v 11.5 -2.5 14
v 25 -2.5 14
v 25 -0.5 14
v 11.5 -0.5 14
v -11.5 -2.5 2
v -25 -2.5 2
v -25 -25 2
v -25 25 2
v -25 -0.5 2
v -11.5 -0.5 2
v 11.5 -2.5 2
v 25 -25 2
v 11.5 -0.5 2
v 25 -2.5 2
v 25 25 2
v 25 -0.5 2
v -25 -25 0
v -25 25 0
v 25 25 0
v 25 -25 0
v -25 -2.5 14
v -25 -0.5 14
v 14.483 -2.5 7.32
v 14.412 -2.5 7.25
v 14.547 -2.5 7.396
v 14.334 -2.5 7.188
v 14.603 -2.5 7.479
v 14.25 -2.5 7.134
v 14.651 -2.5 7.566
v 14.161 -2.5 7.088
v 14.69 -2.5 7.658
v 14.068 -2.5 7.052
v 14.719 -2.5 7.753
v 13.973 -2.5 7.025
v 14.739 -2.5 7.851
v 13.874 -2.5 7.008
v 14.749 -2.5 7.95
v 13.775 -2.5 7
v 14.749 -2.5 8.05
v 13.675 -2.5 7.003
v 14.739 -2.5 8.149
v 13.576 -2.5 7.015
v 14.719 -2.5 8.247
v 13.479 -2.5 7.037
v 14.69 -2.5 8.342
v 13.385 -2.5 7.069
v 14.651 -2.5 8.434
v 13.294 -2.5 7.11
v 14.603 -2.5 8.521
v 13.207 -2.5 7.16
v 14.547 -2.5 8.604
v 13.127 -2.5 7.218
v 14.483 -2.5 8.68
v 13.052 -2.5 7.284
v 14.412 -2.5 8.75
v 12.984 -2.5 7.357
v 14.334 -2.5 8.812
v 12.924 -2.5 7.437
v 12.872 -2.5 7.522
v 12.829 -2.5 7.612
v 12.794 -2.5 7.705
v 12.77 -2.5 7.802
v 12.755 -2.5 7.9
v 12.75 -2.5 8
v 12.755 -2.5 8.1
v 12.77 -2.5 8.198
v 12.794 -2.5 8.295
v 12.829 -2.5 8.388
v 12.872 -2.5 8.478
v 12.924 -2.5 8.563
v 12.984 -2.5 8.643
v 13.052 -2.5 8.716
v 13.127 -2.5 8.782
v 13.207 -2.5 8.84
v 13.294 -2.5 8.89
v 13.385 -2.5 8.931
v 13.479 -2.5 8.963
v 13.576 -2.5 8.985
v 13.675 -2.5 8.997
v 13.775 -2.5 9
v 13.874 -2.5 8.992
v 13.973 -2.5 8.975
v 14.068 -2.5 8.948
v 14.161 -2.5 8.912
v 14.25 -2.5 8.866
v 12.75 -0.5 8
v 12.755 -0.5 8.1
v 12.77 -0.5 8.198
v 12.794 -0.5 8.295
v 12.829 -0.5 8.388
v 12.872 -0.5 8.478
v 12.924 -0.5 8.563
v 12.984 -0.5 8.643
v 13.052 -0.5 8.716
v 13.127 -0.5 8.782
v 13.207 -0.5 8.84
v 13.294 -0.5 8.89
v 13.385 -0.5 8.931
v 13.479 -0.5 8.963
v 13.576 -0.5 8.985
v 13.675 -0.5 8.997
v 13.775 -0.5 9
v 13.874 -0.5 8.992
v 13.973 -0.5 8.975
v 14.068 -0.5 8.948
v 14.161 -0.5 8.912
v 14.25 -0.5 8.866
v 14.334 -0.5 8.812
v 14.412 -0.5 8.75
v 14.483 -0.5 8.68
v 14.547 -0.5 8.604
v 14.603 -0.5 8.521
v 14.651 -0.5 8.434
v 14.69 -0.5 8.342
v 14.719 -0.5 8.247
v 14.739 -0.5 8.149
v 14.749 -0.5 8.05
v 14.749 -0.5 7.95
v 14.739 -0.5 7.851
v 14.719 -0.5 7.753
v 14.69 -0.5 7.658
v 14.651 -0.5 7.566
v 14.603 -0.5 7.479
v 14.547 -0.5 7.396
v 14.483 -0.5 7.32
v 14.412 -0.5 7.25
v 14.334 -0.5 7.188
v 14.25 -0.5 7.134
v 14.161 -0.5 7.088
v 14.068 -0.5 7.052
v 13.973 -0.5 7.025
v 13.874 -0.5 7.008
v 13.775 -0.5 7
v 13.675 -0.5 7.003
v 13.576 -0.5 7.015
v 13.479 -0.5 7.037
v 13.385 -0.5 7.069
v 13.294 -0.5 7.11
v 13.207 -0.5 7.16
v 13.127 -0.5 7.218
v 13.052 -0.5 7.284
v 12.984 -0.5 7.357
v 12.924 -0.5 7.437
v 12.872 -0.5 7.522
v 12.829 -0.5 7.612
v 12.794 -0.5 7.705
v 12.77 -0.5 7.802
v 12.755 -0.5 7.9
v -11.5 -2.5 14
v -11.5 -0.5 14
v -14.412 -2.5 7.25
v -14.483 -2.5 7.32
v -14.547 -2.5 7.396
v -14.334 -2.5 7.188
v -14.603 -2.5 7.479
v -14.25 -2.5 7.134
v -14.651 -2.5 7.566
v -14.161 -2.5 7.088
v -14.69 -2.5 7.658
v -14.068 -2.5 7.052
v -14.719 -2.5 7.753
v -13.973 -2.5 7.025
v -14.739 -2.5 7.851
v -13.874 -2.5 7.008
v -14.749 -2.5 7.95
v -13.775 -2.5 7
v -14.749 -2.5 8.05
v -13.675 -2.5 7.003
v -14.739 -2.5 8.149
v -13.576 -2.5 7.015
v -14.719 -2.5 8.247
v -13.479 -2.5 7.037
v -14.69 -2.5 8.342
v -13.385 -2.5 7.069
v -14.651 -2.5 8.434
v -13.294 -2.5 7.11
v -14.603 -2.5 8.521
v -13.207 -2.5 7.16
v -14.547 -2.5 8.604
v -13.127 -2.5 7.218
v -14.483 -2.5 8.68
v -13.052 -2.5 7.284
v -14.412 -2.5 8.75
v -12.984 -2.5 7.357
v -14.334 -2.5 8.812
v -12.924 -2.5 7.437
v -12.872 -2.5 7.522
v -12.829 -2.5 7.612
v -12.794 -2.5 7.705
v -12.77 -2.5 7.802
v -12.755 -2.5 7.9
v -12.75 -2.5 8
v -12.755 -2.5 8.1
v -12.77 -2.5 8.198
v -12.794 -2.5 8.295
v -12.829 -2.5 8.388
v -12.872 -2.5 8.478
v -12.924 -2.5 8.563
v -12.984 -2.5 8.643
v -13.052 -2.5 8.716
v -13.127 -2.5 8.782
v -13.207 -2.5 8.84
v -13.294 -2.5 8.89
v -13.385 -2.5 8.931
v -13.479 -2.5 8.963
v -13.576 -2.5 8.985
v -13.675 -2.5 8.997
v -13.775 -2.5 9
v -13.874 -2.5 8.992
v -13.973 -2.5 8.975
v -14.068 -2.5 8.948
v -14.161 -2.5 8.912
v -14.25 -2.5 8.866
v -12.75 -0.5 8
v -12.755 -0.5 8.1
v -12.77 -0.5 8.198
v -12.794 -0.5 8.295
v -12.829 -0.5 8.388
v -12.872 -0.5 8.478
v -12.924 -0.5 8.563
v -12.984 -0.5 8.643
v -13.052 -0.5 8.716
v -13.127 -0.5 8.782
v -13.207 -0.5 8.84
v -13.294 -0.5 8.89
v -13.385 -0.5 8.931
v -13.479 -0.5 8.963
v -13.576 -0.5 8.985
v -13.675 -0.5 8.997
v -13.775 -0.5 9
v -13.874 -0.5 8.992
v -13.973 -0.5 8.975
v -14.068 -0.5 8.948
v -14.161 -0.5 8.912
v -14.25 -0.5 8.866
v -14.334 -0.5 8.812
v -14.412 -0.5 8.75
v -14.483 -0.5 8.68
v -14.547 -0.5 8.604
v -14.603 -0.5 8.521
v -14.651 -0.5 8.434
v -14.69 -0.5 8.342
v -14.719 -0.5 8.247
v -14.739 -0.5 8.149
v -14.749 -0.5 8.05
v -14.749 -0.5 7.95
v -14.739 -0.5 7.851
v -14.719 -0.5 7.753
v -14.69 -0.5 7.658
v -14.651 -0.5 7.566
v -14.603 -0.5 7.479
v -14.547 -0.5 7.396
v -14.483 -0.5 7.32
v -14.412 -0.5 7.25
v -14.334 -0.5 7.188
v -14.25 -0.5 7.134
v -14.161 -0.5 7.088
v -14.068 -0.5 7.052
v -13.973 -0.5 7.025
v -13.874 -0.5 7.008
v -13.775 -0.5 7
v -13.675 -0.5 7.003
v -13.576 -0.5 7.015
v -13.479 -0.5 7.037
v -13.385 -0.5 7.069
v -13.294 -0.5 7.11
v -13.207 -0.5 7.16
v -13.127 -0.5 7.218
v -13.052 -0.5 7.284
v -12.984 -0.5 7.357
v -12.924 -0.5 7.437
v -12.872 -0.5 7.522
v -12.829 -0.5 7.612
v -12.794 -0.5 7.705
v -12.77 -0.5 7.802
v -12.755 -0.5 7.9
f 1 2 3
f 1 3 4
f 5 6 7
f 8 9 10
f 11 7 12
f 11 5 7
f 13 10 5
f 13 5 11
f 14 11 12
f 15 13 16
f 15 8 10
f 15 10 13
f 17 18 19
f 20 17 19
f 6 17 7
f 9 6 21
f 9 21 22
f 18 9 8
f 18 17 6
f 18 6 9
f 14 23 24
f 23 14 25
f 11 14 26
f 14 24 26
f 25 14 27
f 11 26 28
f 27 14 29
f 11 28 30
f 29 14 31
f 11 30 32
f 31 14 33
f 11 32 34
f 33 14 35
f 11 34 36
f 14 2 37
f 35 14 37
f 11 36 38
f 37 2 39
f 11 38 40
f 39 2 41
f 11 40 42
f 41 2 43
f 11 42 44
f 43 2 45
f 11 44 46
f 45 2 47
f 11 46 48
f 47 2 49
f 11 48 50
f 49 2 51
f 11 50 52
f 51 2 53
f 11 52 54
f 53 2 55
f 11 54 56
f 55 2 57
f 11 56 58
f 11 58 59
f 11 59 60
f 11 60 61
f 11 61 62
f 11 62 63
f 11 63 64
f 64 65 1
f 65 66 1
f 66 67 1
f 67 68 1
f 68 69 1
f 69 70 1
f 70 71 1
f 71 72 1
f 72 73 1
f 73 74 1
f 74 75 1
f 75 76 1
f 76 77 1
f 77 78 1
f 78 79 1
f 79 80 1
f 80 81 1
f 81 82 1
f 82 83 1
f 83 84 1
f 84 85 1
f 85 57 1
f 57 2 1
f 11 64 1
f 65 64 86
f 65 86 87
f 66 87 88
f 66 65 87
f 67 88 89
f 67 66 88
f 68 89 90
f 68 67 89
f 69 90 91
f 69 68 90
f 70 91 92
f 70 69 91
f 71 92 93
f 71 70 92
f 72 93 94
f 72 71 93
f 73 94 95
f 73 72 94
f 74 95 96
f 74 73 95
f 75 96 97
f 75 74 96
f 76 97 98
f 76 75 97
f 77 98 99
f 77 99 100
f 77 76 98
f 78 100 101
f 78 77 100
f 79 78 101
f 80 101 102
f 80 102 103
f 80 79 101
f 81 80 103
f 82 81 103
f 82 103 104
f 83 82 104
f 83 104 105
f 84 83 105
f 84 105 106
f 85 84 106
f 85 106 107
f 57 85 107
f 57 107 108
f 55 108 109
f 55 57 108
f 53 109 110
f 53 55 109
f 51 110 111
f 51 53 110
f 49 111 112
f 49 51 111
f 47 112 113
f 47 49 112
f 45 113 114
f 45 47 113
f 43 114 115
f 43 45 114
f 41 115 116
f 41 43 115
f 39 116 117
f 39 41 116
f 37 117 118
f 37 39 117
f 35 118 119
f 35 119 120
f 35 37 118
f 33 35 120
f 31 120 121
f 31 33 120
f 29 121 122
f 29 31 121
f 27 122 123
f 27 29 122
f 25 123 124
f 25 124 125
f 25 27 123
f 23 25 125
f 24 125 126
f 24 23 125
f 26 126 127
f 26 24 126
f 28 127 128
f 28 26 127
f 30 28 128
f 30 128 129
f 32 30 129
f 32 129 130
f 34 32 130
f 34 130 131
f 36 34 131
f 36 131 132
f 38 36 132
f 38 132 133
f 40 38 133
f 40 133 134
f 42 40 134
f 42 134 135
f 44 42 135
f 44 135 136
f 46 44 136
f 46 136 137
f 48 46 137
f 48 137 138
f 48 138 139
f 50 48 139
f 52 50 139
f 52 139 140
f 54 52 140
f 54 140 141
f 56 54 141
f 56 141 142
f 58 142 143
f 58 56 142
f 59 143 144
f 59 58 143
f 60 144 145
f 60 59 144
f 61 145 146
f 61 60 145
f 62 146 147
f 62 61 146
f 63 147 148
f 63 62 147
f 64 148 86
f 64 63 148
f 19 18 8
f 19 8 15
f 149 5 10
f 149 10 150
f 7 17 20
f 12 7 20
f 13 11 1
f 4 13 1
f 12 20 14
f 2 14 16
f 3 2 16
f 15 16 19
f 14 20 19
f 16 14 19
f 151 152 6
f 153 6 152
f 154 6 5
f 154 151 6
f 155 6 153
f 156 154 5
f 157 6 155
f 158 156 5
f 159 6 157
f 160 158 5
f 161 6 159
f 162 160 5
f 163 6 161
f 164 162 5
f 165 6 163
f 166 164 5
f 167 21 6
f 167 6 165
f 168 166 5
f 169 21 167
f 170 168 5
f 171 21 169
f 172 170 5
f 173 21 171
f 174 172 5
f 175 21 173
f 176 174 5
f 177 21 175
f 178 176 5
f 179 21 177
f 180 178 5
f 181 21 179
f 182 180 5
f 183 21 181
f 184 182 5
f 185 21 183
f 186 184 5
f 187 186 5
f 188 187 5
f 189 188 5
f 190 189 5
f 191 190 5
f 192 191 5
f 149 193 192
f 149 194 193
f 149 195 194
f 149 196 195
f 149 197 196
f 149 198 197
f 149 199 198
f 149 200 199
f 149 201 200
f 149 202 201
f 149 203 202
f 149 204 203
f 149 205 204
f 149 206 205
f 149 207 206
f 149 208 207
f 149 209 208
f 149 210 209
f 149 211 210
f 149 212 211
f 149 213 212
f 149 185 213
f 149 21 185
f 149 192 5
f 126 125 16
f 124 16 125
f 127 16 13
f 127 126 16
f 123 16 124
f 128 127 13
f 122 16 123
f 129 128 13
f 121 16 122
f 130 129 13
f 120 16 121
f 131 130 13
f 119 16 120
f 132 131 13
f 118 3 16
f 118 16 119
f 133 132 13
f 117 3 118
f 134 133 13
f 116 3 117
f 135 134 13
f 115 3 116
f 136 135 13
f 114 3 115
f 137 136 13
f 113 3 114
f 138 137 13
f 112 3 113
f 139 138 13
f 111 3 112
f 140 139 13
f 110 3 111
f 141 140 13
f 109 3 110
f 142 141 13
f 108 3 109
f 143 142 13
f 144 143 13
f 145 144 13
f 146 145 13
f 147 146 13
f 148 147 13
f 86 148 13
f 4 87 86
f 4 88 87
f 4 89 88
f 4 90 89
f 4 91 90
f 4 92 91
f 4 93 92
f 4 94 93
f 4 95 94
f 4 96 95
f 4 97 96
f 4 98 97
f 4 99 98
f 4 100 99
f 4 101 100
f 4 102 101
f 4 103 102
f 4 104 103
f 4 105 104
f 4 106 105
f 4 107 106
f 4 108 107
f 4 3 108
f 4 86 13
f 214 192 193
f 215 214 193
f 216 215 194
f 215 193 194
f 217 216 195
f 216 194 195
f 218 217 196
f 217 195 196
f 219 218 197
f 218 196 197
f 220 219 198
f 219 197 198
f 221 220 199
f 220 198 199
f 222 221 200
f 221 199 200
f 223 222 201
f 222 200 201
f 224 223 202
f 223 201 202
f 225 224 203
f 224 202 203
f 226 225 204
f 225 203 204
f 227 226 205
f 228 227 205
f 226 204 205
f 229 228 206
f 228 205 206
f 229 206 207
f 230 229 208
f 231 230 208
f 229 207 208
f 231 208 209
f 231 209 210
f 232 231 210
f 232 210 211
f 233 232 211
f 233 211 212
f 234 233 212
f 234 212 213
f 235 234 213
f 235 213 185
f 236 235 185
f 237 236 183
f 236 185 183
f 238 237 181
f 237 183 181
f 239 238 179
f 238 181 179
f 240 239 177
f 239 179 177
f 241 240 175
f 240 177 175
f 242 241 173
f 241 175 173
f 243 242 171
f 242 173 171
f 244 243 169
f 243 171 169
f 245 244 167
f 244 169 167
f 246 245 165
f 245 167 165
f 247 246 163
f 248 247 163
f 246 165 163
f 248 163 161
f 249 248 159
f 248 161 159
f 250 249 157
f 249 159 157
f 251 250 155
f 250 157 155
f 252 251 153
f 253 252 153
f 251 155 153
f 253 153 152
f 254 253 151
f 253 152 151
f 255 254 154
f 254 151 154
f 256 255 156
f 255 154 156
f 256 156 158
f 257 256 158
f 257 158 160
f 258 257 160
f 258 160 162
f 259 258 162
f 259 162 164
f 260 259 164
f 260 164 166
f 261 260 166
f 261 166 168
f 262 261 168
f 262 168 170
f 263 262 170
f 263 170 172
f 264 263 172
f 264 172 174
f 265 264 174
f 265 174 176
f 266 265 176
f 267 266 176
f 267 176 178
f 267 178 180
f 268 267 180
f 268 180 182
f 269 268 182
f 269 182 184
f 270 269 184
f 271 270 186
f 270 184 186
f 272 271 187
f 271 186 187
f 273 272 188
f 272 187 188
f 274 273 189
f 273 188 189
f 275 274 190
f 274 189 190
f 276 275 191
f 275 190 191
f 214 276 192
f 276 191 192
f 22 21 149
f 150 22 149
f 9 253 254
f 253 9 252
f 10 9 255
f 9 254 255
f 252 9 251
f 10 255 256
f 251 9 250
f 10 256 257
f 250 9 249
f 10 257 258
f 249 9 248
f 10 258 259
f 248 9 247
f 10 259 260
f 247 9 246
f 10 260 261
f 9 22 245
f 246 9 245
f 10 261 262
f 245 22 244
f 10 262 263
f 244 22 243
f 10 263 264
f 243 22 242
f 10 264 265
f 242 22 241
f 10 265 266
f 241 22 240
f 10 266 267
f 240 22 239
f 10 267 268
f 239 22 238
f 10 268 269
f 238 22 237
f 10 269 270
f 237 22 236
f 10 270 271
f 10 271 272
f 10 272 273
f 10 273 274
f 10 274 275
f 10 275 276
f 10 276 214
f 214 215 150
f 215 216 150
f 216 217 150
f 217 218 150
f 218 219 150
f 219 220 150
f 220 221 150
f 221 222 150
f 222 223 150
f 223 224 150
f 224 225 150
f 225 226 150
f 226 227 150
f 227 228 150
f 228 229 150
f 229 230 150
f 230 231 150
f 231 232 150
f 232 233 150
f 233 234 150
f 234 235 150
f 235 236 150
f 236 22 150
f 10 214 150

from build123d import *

# Parameters (mm, degrees)
SKETCH_1_W      = 50
SKETCH_1_H      = 50
EXTRUDE_1_DEPTH = 2
EXTRUDE_START   = -22.5
SKETCH_3_W      = 13.5
SKETCH_3_H      = 12
SKETCH_3_R      = 1
EXTRUDE_3_DEPTH = 2


with BuildPart() as part:
    # 草图1 → 凸台-拉伸1 (new body)
    with BuildSketch(Plane.XY):
        Rectangle(SKETCH_1_W, SKETCH_1_H)
    extrude(amount=EXTRUDE_1_DEPTH)

    # 草图3 → 凸台-拉伸3 (add)
    with BuildSketch(Plane.XZ.offset(25).offset(EXTRUDE_START)):
        with Locations((-18.25, 8)):
            Rectangle(SKETCH_3_W, SKETCH_3_H)
        with Locations((-13.75, 8)):
            Circle(SKETCH_3_R, mode=Mode.SUBTRACT)
    extrude_3 = extrude(amount=-EXTRUDE_3_DEPTH)

    # 镜向1: 凸台-拉伸3 across plane
    add(extrude_3.mirror(Plane(origin=(0, 0, 0), x_dir=(0, 0, 1), z_dir=(1, 0, 0))))


solid = part.part
